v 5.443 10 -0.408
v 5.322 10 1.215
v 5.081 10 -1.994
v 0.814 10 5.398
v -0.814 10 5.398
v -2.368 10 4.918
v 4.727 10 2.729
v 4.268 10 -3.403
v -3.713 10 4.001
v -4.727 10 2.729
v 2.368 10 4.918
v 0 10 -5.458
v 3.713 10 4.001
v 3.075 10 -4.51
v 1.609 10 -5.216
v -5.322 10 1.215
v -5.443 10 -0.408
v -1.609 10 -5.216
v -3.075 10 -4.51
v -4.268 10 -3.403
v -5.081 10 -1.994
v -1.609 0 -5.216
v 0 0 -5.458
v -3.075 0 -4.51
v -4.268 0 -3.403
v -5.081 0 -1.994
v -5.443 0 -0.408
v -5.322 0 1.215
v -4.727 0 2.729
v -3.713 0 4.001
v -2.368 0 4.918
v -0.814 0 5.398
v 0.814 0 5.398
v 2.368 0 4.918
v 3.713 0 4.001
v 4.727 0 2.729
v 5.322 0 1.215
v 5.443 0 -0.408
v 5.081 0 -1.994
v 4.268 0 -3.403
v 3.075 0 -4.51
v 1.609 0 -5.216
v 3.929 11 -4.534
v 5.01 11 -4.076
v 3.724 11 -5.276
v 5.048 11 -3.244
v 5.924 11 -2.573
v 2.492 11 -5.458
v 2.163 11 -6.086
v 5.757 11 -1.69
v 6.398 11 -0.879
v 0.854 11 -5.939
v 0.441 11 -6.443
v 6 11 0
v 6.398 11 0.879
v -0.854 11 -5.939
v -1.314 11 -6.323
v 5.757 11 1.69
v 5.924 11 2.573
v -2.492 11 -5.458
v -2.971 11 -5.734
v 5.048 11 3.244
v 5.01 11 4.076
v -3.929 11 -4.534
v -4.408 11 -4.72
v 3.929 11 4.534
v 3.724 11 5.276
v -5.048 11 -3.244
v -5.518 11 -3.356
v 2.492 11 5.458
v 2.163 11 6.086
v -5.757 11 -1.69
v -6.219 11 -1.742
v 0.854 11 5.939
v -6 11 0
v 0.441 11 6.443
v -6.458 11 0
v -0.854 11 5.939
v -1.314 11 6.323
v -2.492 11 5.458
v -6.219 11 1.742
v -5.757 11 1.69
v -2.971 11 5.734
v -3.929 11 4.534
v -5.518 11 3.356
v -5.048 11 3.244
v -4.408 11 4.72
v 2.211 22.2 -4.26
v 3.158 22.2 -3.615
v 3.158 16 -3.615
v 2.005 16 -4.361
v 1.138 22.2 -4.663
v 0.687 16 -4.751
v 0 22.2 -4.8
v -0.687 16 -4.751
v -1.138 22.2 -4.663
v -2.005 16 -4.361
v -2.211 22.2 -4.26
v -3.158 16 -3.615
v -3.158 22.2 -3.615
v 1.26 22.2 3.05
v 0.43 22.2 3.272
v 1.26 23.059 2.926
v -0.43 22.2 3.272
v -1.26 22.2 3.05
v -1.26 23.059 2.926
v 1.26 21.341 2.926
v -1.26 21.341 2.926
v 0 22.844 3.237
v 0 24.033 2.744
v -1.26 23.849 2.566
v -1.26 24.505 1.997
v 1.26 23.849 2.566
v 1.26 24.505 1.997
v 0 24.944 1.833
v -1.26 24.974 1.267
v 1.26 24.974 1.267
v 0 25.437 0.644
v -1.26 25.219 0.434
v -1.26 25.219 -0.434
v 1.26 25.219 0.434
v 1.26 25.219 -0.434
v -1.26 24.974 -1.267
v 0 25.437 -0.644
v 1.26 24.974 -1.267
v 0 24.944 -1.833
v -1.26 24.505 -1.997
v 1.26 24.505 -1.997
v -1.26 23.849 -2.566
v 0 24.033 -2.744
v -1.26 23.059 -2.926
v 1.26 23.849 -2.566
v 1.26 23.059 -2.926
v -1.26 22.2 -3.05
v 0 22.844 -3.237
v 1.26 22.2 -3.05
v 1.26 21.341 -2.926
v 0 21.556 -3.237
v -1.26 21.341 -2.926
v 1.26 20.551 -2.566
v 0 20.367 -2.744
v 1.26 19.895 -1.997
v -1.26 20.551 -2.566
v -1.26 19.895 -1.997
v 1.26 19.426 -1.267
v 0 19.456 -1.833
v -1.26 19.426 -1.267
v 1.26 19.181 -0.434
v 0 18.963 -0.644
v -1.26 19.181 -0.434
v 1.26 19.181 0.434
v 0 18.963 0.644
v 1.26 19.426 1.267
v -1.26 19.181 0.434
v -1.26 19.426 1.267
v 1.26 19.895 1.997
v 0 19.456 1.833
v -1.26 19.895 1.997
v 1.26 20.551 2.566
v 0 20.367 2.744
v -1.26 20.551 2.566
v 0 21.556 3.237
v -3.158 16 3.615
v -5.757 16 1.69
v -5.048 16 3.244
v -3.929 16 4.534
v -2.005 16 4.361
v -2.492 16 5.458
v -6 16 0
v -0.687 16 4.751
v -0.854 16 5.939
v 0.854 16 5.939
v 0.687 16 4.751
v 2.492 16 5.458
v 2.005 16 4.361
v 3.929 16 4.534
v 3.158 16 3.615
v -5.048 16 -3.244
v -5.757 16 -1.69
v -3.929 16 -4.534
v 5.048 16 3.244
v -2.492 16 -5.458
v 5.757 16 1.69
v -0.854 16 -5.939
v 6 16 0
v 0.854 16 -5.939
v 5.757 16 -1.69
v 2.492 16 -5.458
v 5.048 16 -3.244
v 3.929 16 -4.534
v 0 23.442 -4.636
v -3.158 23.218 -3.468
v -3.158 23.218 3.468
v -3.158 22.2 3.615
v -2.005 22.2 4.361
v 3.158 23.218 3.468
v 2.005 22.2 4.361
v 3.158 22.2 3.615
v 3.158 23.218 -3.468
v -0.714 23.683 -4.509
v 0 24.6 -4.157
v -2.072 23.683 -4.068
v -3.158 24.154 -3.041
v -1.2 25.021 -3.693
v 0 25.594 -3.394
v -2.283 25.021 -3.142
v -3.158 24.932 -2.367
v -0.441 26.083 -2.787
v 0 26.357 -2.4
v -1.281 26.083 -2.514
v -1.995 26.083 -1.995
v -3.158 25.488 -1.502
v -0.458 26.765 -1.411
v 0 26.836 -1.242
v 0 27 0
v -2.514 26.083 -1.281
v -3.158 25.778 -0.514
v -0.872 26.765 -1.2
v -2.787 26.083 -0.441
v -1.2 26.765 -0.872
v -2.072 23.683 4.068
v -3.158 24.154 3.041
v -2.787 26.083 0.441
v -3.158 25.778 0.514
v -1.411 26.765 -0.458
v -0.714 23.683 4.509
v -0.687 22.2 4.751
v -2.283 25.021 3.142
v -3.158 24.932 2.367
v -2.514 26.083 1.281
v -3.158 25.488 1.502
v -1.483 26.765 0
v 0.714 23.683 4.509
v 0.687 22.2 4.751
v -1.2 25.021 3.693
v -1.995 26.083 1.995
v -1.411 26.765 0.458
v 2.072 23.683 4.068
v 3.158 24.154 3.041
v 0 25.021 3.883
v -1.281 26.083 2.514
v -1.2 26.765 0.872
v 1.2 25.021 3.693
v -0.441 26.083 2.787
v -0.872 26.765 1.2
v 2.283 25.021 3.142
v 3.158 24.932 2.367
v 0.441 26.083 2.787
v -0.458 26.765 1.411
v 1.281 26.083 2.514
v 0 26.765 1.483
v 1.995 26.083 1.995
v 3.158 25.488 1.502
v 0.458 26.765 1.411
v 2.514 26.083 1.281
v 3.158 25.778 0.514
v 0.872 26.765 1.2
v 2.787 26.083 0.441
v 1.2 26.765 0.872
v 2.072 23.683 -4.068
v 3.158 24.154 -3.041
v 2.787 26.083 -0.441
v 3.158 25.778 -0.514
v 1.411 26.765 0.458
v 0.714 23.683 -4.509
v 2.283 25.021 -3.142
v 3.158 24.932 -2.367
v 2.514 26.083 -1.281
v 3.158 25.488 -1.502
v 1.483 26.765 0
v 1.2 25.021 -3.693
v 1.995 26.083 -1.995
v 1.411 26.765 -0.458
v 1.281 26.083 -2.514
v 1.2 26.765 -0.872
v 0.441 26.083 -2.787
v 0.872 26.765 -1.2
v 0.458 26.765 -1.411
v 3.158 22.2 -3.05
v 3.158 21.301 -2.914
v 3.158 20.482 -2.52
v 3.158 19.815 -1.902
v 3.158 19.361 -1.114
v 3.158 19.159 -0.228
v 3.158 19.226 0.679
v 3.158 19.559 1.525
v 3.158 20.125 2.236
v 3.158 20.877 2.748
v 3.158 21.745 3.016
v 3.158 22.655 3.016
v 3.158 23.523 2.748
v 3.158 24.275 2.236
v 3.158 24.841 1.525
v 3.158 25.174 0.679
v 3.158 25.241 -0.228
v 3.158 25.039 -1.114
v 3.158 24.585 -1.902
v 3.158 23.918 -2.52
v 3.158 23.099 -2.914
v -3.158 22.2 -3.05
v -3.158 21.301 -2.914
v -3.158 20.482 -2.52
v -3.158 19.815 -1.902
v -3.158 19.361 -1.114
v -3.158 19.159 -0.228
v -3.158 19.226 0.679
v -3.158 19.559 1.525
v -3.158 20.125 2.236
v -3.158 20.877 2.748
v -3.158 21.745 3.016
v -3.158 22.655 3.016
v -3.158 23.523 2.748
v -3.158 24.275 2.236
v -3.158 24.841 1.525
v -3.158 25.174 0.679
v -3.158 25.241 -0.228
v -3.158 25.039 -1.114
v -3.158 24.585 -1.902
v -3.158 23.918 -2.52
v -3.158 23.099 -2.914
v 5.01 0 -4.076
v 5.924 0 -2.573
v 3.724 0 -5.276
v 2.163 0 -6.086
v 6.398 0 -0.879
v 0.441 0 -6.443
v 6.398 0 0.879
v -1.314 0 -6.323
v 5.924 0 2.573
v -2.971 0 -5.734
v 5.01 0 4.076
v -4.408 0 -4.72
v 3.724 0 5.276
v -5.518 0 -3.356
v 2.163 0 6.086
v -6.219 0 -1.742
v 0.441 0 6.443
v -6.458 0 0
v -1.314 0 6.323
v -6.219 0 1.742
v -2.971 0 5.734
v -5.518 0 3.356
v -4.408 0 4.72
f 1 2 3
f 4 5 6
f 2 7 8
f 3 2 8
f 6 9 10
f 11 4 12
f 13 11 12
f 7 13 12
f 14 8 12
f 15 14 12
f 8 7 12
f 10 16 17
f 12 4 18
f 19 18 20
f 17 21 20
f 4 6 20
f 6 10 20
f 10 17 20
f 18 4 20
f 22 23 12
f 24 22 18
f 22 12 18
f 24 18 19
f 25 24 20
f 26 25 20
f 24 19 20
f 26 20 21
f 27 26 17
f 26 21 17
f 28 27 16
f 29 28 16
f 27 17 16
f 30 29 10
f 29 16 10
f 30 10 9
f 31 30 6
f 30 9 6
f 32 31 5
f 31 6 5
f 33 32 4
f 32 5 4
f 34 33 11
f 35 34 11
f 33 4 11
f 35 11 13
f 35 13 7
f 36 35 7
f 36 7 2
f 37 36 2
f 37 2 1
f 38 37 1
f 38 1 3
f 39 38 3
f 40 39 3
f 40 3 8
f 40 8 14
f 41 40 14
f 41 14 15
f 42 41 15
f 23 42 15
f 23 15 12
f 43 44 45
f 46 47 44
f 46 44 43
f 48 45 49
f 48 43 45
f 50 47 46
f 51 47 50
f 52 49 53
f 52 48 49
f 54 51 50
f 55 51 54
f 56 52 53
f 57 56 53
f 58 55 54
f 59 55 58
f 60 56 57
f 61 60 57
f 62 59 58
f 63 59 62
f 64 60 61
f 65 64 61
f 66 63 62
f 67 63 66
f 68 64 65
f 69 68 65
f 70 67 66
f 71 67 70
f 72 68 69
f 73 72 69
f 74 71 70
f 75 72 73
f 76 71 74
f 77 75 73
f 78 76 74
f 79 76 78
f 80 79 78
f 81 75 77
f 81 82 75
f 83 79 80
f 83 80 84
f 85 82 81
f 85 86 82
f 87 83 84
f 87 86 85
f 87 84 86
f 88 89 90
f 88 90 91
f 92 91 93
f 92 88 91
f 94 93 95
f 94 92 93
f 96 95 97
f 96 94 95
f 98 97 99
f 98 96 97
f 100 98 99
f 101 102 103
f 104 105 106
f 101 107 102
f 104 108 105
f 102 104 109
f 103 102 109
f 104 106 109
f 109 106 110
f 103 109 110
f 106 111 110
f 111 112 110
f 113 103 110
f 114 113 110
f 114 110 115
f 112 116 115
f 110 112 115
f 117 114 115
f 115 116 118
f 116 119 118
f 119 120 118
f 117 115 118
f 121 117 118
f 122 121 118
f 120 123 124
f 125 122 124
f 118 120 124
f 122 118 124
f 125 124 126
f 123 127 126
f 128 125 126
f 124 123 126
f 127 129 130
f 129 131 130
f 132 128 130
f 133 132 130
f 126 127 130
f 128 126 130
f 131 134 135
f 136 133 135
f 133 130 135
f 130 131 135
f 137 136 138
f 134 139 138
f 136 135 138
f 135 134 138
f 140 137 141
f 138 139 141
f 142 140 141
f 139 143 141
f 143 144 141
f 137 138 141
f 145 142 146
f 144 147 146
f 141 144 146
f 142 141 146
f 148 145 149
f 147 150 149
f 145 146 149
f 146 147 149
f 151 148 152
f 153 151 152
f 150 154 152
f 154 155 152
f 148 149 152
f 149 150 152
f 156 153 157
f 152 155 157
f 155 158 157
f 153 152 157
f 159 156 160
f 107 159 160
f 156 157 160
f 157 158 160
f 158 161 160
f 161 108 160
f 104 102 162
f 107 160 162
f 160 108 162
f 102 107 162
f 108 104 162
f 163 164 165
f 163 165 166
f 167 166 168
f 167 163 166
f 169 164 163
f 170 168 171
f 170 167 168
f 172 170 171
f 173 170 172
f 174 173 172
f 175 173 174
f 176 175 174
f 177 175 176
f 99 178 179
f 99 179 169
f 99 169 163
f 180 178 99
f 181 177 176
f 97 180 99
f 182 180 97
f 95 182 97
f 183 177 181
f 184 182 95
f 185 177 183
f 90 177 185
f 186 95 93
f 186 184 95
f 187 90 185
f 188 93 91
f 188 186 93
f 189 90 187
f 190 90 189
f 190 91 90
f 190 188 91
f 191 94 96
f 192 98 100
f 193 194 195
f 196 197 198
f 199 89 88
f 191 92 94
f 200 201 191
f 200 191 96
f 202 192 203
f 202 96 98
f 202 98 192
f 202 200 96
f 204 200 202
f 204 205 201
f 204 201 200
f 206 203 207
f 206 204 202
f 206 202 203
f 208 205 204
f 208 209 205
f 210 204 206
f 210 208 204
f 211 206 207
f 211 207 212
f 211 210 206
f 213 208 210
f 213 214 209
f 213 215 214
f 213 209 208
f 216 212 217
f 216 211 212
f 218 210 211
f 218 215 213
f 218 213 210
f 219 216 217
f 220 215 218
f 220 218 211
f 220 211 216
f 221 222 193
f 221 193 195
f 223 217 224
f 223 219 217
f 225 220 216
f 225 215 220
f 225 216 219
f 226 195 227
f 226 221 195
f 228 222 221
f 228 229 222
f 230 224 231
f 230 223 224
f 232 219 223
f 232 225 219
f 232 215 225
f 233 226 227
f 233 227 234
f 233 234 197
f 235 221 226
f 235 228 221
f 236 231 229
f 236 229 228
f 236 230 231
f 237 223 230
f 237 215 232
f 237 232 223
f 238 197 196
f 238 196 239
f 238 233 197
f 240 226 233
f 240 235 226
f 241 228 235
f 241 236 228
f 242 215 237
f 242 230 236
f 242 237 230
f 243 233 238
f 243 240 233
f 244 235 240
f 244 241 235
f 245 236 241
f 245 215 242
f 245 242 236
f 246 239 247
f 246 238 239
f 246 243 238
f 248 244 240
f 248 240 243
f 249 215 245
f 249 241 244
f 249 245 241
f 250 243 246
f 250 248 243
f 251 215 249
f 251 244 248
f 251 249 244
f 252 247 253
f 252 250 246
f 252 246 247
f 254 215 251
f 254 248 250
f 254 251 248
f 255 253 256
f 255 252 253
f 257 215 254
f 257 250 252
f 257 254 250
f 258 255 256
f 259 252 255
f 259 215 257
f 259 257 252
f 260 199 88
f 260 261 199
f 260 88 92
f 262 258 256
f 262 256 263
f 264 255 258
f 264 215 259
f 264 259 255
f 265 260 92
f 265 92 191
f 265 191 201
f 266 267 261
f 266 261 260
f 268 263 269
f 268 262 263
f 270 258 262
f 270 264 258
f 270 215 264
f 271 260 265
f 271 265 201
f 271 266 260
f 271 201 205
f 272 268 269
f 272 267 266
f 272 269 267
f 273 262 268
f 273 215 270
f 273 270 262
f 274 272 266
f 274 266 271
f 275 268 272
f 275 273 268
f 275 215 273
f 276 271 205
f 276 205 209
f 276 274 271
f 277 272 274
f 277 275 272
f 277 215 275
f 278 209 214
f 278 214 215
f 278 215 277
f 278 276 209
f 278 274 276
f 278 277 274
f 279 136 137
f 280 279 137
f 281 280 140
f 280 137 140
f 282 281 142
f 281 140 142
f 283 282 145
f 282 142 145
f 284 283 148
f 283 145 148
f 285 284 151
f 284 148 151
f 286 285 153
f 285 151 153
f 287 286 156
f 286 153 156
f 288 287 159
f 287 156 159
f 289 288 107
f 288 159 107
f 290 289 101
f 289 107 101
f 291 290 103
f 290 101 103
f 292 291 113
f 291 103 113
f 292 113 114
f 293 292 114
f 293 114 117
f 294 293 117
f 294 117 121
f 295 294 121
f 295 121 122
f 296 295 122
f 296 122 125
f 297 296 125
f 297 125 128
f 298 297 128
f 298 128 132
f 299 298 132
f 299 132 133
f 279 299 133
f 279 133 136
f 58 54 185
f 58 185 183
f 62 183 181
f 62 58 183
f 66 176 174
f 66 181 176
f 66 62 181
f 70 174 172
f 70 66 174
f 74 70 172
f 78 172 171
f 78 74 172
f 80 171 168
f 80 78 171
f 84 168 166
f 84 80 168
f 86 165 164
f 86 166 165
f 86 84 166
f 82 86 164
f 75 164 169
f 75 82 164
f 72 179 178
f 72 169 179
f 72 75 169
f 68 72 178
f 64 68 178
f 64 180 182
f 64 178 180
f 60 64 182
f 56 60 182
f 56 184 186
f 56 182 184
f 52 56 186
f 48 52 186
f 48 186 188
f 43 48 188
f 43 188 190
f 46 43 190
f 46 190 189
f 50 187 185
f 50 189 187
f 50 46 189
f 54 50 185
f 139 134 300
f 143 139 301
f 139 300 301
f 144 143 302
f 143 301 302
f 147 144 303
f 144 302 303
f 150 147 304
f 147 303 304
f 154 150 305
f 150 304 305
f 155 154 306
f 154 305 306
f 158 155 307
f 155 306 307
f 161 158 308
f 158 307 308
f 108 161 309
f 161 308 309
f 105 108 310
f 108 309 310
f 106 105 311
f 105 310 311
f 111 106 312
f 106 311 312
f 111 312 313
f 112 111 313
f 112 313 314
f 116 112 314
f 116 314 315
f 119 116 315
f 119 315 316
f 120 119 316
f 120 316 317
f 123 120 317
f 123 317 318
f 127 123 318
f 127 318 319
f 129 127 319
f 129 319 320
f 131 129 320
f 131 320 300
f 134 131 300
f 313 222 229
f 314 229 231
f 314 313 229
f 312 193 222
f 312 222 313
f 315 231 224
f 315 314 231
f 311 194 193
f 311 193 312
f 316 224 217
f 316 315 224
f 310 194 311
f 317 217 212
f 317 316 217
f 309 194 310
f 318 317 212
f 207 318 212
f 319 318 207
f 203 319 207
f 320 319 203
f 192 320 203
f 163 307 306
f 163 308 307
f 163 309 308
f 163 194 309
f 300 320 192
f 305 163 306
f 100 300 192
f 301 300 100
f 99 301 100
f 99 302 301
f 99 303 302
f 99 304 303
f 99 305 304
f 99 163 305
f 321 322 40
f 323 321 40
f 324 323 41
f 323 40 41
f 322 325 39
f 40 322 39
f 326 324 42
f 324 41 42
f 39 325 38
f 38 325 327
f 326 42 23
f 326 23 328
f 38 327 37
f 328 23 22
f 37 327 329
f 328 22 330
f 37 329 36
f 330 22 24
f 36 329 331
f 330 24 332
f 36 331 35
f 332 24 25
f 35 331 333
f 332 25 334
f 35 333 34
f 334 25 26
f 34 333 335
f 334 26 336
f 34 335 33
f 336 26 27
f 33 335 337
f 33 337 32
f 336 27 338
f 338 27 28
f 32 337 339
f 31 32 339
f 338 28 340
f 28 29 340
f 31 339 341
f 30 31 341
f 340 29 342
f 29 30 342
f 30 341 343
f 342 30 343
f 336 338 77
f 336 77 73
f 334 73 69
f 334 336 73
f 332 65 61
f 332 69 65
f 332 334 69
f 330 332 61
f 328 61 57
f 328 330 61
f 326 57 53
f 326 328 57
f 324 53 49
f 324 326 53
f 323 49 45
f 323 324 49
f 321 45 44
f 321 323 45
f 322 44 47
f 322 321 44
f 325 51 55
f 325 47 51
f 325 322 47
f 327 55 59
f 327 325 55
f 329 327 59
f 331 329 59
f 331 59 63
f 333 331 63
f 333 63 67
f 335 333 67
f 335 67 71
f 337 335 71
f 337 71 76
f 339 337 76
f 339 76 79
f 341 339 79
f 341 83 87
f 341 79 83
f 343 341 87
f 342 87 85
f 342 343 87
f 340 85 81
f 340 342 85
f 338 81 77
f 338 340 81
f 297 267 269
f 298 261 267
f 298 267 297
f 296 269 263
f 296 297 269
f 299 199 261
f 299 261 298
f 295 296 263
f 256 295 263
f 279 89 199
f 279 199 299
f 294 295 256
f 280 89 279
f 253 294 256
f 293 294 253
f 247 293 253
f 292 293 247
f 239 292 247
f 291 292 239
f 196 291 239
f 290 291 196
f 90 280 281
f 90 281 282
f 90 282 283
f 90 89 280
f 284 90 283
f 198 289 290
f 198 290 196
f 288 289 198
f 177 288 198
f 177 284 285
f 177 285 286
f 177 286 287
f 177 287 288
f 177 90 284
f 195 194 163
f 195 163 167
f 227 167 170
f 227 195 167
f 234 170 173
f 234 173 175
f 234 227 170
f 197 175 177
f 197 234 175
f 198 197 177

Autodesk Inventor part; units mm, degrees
ref_plane "YZ Plane" through (0, 0, 0) normal (1, 0, 0) x (0, 1, 0)
ref_plane "XZ Plane" through (0, 0, 0) normal (0, 1, 0) x (-1, 0, 0)
ref_plane "XY Plane" through (0, 0, 0) normal (0, 0, 1) x (1, 0, 0)
sketch "Sketch1" plane through (0, 0, 0) normal (0, 1, 0) x (-1, 0, 0)
  circle A0 centre (0, 0) radius 6.4585
  dimension "d0" = 12.917
extrude "Extrusion1" add sketch "Sketch1" along normal blind 11
sketch "Sketch2" plane through (0, 11, 0) normal (0, 1, 0) x (1, 0, 0)
  circle A0 centre (0, 0) radius 6.4585 projected
  circle A1 centre (0, 0) radius 6
  dimension "d3" = 12
extrude "Extrusion2" add sketch "Sketch2" along normal blind 5 contours A1
sketch "Sketch3" plane through (0, 0, 0) normal (1, 0, 0) x (0, 1, 0)
  line L0 (16, -6) -> (16, 6) projected
  line L1 (16, -4.8) -> (22.2, -4.8)
  line L2 (22.2, 0) -> (16, 0)
  arc A0 (22.2, -4.8) -> (27, 0) centre (22.2, 0) ccw
  line L3 (0, 6.4585) -> (0, -6.4585) projected
  line L4 (22.2, 0) -> (27, 0)
  line L5 (16, 0) -> (27, 0)
  point P0 (0, 0)
  dimension "d7" = 4.8
  dimension "d13" = 22.2
revolve "Revolution1" add sketch "Sketch3" angle 360 about axis through (0, 16, 0) along (0, 1, 0)
sketch "Sketch4" plane through (0, 16, 0) normal (0, 1, 0) x (1, 0, 0)
  circle A0 centre (0, 0) radius 4.8 projected
  circle A1 centre (0, 0) radius 6 projected
  line L0 (2.5, -11.2443) -> (-2.5, -11.2443)
  line L1 (-2.5, 11.2443) -> (2.5, 11.2443)
  line L2 (2.5, -11.2443) -> (-2.5, 11.2443) construction
  line L3 (-2.5, -11.2443) -> (2.5, 11.2443) construction
  circle A2 centre (0, 0) radius 4.8
  line L4 (2.5, 11.2443) -> (2.5, 5.4544)
  line L5 (3.1579, 3.6149) -> (3.1579, -3.6149)
  line L6 (-3.1579, -3.6149) -> (-3.1579, 3.6149)
  dimension "d9" = 5
extrude "Extrusion3" cut sketch "Sketch4" along normal blind 13.25 contours A0 L5 | L6 A0
hole "Hole1" at (3.1579, 22.2, 0) direction (-1, 0, 0) diameter 6.1 depth 8 tip angle 118
thread "Thread1" size "M14x1" class "6g" standard "ANSI Metric M Profile" full length
thread "Thread2" size "M12x1.25" class "6g" standard "ANSI Metric M Profile" full length
sketch "Sketch5" plane through (0, 0, 0) normal (0, -1, 0) x (1, 0, 0)
  circle A0 centre (0, 0) radius 6.4585 projected
  circle A1 centre (0, 0) radius 6
  dimension "d27" = 12
hole "Hole2" at (0, 0, 0) direction (0, 1, 0) diameter 10.917 depth 10 thread size "M12x1" class "6H" standard "ISO Metric profile"
ref_plane "Work Plane1" through (-0.8421, 22.2, 0) normal (0, -1, 0) x (1, 0, 0)
sketch "Sketch6" plane through (-0.8421, 22.2, 0) normal (0, -1, 0) x (1, 0, 0)
  circle A0 centre (0.8421, 0) radius 3.3
  line L0 (4.1421, 0) -> (-2.4579, 0)
  line L1 (4, 3.05) -> (4, -3.05) projected
  line L2 (-8.1998, 0) -> (9.884, 0) projected
  dimension "d36" = 6.6
revolve "Revolution2" cut sketch "Sketch6" angle 360 about axis through (-0.8421, 22.2, 0) along (1, 0, 0) picked at (4.0262, 0.5339) picked at (-0.2745, 0.2585) contours L0 L1 A0 | L1 L0 A0
properties part number "500-106" material "Stainless Steel"
